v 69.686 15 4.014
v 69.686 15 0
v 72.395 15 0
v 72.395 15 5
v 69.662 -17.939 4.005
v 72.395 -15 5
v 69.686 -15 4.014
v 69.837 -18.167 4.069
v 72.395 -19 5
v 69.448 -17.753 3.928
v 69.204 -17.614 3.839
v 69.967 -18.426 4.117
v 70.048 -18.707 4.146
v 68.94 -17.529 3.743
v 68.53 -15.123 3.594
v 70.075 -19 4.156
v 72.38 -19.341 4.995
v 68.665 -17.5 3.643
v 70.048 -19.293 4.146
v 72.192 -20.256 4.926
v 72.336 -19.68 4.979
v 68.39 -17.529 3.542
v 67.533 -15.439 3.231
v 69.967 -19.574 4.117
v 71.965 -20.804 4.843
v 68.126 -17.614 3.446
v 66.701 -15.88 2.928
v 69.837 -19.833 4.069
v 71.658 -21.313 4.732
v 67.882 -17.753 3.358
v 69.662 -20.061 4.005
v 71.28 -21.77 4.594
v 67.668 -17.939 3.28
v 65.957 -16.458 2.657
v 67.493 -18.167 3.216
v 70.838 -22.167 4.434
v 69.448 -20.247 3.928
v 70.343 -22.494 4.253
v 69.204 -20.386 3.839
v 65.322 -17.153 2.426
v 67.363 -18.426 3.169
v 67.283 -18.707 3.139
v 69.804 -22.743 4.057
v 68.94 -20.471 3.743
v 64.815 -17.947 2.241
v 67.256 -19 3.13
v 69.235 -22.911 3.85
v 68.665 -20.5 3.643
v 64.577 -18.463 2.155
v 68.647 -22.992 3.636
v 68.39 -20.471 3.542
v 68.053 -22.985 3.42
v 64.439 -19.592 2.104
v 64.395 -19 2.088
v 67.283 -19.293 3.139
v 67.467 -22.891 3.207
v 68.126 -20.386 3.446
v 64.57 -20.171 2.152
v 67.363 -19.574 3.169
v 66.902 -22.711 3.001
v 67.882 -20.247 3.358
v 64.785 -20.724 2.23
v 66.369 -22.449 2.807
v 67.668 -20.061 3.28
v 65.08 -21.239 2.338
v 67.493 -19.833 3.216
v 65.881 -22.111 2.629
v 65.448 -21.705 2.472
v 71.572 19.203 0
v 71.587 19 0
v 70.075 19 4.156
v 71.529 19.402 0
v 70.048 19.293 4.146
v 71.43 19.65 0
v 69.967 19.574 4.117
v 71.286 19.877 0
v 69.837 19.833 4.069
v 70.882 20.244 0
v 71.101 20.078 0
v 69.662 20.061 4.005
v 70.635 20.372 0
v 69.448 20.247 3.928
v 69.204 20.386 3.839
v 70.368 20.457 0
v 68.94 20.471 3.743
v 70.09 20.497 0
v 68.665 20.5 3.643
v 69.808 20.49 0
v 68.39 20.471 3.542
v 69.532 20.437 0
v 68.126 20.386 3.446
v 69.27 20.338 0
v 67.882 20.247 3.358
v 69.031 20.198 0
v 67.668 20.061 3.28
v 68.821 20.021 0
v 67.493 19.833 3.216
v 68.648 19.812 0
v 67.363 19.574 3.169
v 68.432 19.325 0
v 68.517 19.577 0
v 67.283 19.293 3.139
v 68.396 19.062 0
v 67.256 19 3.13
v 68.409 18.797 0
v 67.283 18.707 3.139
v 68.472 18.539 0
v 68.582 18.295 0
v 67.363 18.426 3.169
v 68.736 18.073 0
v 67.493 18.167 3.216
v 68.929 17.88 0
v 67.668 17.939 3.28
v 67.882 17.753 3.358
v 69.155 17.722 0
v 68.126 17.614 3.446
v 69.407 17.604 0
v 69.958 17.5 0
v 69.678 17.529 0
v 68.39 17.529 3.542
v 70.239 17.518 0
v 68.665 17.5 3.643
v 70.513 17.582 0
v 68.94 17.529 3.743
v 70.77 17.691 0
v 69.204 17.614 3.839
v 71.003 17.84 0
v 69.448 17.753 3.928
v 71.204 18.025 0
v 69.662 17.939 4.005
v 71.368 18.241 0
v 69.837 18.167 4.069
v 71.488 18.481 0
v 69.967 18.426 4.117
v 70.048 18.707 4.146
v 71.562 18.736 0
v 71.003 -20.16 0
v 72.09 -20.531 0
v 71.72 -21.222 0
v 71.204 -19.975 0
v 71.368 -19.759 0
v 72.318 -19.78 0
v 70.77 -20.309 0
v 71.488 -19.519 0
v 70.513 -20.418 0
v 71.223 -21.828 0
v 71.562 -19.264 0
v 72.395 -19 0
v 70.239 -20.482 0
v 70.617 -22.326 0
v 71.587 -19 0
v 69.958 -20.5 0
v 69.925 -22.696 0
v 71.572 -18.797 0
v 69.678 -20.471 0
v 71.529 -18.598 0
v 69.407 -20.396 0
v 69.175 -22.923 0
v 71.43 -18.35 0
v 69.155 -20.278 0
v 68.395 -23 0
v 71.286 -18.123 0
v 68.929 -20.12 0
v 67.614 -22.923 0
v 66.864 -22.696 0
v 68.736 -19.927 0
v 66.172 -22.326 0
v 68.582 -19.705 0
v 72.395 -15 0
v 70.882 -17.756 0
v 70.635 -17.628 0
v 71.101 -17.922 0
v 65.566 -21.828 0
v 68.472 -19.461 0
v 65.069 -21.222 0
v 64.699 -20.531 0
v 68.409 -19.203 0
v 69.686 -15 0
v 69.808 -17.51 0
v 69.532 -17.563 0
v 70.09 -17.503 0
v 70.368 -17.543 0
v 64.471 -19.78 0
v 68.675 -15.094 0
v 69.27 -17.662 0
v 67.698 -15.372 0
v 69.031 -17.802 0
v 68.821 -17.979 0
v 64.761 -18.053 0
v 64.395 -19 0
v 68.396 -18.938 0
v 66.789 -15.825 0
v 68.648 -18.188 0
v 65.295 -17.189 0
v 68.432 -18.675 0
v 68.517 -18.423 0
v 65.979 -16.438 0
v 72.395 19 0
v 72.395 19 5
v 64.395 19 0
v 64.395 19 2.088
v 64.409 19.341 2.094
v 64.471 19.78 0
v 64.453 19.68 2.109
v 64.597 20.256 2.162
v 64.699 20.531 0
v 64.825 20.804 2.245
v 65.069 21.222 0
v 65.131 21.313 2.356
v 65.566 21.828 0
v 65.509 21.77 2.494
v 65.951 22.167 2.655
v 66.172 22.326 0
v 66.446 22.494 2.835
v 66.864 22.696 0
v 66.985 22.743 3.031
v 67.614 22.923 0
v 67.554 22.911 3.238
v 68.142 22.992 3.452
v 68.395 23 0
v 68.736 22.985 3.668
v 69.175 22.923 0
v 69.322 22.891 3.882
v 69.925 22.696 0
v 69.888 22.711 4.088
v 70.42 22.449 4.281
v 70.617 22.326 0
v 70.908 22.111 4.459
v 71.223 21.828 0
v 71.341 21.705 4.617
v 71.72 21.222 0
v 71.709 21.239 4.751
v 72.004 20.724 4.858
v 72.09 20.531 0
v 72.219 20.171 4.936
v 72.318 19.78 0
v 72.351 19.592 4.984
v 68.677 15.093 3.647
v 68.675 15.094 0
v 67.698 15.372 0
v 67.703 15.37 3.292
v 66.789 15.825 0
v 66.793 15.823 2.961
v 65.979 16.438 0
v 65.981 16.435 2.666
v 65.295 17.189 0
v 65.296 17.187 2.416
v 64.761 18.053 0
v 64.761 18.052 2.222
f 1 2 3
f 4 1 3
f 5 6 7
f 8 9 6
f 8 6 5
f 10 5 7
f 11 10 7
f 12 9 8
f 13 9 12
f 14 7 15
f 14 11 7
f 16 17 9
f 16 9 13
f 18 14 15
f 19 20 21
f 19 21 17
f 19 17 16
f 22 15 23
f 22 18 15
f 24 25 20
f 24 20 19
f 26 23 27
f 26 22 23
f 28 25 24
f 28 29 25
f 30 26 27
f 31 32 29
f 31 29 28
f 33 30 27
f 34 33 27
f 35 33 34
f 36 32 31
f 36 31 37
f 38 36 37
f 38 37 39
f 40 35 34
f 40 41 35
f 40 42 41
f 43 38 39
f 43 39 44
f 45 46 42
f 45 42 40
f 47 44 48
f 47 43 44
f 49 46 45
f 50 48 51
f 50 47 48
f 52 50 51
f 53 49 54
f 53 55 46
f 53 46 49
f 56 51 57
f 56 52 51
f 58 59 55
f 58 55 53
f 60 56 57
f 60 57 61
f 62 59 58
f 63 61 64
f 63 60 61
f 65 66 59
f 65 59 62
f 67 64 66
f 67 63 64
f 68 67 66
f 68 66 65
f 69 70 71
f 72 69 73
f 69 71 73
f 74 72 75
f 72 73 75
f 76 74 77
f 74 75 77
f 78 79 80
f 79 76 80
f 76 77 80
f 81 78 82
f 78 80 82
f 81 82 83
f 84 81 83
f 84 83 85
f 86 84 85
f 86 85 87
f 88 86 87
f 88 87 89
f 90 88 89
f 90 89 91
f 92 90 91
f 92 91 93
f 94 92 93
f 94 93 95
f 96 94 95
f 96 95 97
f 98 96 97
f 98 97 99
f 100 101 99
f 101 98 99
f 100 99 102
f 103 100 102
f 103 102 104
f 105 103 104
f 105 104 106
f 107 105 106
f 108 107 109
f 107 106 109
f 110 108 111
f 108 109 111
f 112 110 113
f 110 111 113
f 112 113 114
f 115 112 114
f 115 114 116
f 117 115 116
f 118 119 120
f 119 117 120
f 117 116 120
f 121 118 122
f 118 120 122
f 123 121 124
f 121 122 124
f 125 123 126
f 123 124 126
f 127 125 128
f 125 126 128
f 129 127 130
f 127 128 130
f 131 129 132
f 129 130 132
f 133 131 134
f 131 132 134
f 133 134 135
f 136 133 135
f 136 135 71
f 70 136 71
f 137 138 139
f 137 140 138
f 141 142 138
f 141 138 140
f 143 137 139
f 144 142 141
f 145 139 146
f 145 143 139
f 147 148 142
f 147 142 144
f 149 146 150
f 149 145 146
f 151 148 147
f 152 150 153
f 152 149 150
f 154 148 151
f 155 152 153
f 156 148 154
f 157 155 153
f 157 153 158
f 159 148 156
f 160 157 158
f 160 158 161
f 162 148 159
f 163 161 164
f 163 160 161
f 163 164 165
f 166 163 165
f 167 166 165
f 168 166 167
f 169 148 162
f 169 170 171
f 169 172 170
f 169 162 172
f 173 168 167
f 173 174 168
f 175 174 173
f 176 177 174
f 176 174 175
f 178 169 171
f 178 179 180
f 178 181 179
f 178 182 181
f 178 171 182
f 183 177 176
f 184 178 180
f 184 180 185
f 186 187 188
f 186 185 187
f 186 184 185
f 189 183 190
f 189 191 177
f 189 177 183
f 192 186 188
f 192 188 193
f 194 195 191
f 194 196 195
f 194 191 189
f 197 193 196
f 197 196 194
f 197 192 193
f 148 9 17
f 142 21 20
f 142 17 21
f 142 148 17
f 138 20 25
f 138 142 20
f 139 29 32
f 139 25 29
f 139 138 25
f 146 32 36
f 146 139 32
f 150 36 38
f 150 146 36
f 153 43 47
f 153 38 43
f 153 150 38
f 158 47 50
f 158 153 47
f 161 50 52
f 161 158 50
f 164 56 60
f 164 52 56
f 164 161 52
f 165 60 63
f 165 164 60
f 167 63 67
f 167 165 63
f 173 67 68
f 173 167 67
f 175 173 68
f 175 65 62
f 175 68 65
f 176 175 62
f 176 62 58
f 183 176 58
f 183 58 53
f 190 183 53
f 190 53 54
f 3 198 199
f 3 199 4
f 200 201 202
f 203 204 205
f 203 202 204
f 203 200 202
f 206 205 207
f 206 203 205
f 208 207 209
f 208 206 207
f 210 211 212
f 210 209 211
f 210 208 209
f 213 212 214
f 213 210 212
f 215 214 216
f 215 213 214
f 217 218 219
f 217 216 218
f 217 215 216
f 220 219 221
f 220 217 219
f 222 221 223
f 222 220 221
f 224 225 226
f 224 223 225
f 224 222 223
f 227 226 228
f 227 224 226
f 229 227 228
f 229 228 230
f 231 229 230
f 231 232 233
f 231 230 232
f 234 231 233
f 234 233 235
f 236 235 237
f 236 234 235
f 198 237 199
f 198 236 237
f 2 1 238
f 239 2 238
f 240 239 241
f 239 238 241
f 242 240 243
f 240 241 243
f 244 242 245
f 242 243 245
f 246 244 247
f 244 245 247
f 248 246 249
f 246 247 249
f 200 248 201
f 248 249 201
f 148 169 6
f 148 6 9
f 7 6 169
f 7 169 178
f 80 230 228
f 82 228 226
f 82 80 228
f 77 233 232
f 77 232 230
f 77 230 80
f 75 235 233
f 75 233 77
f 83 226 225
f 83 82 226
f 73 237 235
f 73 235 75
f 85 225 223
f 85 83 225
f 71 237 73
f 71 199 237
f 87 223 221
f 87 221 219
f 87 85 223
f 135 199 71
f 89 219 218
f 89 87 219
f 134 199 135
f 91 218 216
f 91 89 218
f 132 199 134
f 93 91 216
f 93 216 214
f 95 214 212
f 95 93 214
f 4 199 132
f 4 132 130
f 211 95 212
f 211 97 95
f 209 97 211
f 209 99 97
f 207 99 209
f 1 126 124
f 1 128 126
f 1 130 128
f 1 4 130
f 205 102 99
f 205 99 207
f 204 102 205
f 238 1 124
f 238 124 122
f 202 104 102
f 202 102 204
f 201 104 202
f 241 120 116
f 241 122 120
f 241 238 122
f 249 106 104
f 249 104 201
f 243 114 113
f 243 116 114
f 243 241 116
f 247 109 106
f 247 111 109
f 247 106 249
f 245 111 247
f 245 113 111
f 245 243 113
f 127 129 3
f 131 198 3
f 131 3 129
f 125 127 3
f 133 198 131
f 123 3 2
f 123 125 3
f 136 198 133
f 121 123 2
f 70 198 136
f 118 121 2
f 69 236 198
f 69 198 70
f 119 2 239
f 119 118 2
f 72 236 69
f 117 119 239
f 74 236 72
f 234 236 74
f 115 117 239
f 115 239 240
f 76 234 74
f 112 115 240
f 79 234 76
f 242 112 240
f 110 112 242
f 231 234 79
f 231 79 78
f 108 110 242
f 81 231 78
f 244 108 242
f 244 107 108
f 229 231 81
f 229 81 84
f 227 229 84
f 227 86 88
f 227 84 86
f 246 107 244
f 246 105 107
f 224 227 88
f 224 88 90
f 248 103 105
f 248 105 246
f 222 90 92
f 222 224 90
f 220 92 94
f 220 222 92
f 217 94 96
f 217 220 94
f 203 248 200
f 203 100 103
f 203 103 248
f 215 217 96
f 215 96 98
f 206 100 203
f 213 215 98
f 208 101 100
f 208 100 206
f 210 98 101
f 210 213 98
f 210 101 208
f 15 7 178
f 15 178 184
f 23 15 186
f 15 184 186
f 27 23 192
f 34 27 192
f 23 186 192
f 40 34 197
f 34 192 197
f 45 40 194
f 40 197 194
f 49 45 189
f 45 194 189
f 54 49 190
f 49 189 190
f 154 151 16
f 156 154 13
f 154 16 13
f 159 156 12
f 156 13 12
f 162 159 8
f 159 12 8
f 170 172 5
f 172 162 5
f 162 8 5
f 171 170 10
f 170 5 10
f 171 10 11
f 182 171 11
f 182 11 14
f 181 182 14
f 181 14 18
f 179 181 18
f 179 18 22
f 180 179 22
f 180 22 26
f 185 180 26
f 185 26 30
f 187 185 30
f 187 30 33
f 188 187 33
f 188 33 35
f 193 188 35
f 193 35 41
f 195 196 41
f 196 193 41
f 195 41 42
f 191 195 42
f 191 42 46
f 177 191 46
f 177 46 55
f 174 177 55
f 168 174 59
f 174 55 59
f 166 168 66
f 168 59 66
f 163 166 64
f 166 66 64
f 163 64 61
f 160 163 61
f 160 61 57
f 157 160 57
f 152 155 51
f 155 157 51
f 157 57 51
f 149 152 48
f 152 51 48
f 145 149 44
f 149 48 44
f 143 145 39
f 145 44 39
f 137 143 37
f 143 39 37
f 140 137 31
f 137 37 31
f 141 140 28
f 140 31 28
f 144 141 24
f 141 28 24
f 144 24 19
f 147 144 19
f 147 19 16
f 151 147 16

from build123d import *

# Parameters (mm, degrees)
BOSS_EXTRUDE1_DEPTH     = 5
CUT_EXTRUDE1_DEPTH      = 77.124744118
CUT_EXTRUDE1_DEPTH_BACK = 77.124744118
SKETCH3_R               = 1.5
CUT_EXTRUDE2_DEPTH      = 91
SPLIT1_SURFACE_1_BACK   = 47.957
SPLIT1_SURFACE_1_DEPTH  = 95.914
FILLET1_R               = 5.5
FILLET2_R               = 5.5


with BuildPart() as part:
    # Sketch1 → Boss-Extrude1 (new body)
    with BuildSketch(Plane.XY):
        with BuildLine():
            Line((72.394590039, 19), (72.394590039, -19))
            ThreePointArc((72.394590039, -19), (68.394590039, -23), (64.394590039, -19))
            Line((64.394590039, -19), (64.394590039, 19))
            ThreePointArc((64.394590039, 19), (68.394590039, 23), (72.394590039, 19))
        make_face()
    extrude(amount=BOSS_EXTRUDE1_DEPTH)

    # Sketch2 → Cut-Extrude1 (cut, two sides: drawn at the far end of the back side and taken through both)
    with BuildSketch(Plane(origin=(0, 0, 0), x_dir=(1, 0, 0), z_dir=(0, 1, 0)).offset(-CUT_EXTRUDE1_DEPTH_BACK)):
        Polygon((72.394590039, -5), (64.394590039, -2.088238126), (64.394590039, -5), align=None)
    extrude(amount=CUT_EXTRUDE1_DEPTH + CUT_EXTRUDE1_DEPTH_BACK, mode=Mode.SUBTRACT)

    # Sketch3 → Cut-Extrude2 (cut)
    with BuildSketch(Plane(origin=(6.86158929, 0, -18.852061635), x_dir=(0.939692620785907, 0, 0.3420201433256727), z_dir=(-0.3420201433256727, 0, 0.939692620785907))):
        with Locations((65.769891562, 19)):
            Circle(SKETCH3_R)
        with Locations((65.769891562, -19)):
            Circle(SKETCH3_R)
    extrude(amount=-CUT_EXTRUDE2_DEPTH, mode=Mode.SUBTRACT)

    # Split1: cut with a surface, the side it looks to stays
    # Split1 surface: a surface, the sketch's curves swept straight by 95.914 mm
    with BuildLine(Plane.XY.offset(-SPLIT1_SURFACE_1_BACK), mode=Mode.PRIVATE) as split1_surface_1_path:
        Line((89.276904546, -15), (55.512275533, -15))
        Line((55.512275533, -15), (55.512275533, 15))
        Line((55.512275533, 15), (89.276904546, 15))
        Line((89.276904546, 15), (89.276904546, -15))
    split1_surface_1 = Shell.extrude(split1_surface_1_path.wire(), (0 * SPLIT1_SURFACE_1_DEPTH, 0 * SPLIT1_SURFACE_1_DEPTH, 1 * SPLIT1_SURFACE_1_DEPTH))
    split(bisect_by=split1_surface_1, keep=Keep.TOP)

    # Fillet1
    # the kernel refuses this fillet: 5.5 mm, written as the material it takes off along each edge
    with BuildSketch(Plane(origin=(64.394590039, 15, 15.316994681), x_dir=(1, 0, 0), z_dir=(0, 0, -1))) as fillet1_piece_1:
        with BuildLine():
            CenterArc((5.291502622, -5.5), FILLET1_R, 90, 74.173379868)
            Line((0, -4), (0, 0))
            Line((0, 0), (5.291502622, 0))
        make_face()
    extrude(amount=28.545751237, mode=Mode.SUBTRACT)

    # Fillet2
    # the kernel refuses this fillet: 5.5 mm, written as the material it takes off along each edge
    with BuildSketch(Plane(origin=(64.394590039, -15, -13.228756555), x_dir=(1, 0, 0), z_dir=(0, 0, 1))) as fillet2_piece_1:
        with BuildLine():
            CenterArc((5.291502622, -5.5), FILLET2_R, 90, 74.173379868)
            Line((0, -4), (0, 0))
            Line((0, 0), (5.291502622, 0))
        make_face()
    extrude(amount=28.545751237, mode=Mode.SUBTRACT)


solid = part.part
